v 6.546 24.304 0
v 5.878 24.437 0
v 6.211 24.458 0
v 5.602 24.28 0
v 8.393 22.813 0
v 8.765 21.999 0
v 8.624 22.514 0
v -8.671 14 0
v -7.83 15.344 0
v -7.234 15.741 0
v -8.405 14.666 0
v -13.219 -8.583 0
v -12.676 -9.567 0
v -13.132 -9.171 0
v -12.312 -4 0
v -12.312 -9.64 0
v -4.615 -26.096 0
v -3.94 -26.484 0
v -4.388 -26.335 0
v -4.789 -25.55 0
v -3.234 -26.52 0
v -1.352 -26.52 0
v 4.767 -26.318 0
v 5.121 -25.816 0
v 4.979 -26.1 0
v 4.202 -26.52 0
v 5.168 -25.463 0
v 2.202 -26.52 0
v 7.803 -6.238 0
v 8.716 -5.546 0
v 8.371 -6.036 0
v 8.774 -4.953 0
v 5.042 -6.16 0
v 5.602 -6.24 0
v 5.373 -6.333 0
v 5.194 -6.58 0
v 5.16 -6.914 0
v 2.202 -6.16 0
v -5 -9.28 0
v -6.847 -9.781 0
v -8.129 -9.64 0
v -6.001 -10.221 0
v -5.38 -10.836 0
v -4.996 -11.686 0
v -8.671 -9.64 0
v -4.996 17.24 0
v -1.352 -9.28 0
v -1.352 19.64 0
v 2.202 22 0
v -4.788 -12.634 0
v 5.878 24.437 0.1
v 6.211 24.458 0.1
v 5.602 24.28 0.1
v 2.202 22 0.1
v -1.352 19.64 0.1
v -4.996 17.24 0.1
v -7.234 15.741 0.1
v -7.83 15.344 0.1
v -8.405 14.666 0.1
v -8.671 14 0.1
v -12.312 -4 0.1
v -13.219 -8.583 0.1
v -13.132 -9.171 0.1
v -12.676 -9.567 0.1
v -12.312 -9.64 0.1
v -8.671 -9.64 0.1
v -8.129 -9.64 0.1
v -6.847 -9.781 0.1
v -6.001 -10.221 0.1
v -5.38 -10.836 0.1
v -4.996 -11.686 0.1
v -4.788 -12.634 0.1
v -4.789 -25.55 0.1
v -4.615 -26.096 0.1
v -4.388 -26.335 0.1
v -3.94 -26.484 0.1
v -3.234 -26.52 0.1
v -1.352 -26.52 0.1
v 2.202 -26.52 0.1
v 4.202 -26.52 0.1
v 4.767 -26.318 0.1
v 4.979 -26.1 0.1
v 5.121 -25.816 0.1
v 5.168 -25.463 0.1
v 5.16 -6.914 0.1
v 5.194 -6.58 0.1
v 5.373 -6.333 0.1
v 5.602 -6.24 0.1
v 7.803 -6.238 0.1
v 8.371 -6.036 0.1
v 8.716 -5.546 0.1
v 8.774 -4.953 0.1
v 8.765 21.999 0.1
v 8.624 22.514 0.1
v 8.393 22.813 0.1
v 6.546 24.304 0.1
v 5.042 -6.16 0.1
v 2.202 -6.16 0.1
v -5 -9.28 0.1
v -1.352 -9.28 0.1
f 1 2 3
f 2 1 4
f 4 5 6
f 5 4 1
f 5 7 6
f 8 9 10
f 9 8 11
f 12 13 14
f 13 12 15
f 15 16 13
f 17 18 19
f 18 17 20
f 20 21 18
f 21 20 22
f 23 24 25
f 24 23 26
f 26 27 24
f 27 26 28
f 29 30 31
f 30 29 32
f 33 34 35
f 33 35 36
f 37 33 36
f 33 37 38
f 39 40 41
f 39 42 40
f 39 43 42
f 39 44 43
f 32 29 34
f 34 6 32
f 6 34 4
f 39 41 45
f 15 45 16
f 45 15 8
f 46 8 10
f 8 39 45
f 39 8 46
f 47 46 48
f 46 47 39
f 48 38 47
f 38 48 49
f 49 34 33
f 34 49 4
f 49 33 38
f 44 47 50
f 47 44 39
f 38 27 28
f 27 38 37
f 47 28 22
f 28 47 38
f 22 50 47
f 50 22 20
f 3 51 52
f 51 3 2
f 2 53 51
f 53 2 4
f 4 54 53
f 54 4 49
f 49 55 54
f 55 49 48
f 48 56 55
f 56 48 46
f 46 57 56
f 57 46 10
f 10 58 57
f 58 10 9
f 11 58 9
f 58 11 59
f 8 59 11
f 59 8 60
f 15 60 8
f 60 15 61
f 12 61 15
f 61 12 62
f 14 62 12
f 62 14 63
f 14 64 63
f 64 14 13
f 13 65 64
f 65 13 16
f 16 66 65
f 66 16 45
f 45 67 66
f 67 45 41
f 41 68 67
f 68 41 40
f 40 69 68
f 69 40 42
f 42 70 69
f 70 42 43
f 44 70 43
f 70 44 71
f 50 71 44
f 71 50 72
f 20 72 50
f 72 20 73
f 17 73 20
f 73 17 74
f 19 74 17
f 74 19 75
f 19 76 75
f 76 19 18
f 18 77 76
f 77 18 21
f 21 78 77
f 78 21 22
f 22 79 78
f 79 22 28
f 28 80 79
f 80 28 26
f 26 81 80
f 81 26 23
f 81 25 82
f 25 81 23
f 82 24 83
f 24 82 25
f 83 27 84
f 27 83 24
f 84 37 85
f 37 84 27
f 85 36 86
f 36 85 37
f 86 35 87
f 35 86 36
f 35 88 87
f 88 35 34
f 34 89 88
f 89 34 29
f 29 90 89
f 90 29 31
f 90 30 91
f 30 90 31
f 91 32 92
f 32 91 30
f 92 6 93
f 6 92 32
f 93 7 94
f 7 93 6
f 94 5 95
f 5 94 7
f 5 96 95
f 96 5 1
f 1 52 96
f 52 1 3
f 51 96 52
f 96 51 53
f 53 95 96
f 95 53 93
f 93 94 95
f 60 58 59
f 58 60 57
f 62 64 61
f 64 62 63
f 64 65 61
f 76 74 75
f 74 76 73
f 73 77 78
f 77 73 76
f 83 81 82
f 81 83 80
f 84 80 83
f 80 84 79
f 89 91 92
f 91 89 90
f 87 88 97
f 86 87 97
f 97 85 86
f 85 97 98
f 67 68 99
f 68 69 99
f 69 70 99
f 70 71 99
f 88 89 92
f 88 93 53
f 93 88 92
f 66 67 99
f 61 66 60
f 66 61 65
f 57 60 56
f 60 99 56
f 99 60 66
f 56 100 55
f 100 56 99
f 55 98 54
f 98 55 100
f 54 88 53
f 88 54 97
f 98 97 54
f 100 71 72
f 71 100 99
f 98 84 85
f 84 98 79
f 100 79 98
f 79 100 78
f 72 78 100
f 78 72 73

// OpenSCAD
// file: s/13710as02.scad
use <../../lib.scad>
function ldraw_lib__s__13710as02() = [
// 0 ~Sticker Top for Technic Panel Fairing Smooth (Medium) Flat
// 0 Name: s\13710as02.dat
// 0 Author: Philippe Hurbain [Philo]
// 0 !LDRAW_ORG Subpart UPDATE 2022-02
// 0 !LICENSE Licensed under CC BY 2.0 and CC BY 4.0 : see CAreadme.txt
// 
// 0 BFC CERTIFY CCW
  [0,"BFC","CERTIFY"],
  [0,"BFC","CCW"],
// 
// 0 !HISTORY 2022-03-06 [PTadmin] Official Update 2022-02
// 
// 
// 0 // Top surface
// 4 16 16.364 -0.25 60.759 15.527 -0.25 61.145 14.695 -0.25 61.093 14.004 -0.25 60.7
  [4,16,16.364,-0.25,60.759,15.527,-0.25,61.145,14.695,-0.25,61.093,14.004,-0.25,60.7],
// 4 16 21.912 -0.25 54.998 20.983 -0.25 57.032 16.364 -0.25 60.759 14.004 -0.25 60.7
  [4,16,21.912,-0.25,54.998,20.983,-0.25,57.032,16.364,-0.25,60.759,14.004,-0.25,60.7],
// 3 16 21.912 -0.25 54.998 21.561 -0.25 56.284 20.983 -0.25 57.032
  [3,16,21.912,-0.25,54.998,21.561,-0.25,56.284,20.983,-0.25,57.032],
// 4 16 -18.084 -0.25 39.353 -19.575 -0.25 38.36 -21.013 -0.25 36.664 -21.677 -0.25 35
  [4,16,-18.084,-0.25,39.353,-19.575,-0.25,38.36,-21.013,-0.25,36.664,-21.677,-0.25,35],
// 4 16 -31.689 -0.25 -23.918 -30.78 -0.25 -10 -33.048 -0.25 -21.458 -32.83 -0.25 -22.928
  [4,16,-31.689,-0.25,-23.918,-30.78,-0.25,-10,-33.048,-0.25,-21.458,-32.83,-0.25,-22.928],
// 3 16 -31.689 -0.25 -23.918 -30.78 -0.25 -24.1 -30.78 -0.25 -10
  [3,16,-31.689,-0.25,-23.918,-30.78,-0.25,-24.1,-30.78,-0.25,-10],
// 4 16 -9.849 -0.25 -66.209 -11.972 -0.25 -63.874 -11.537 -0.25 -65.239 -10.971 -0.25 -65.837
  [4,16,-9.849,-0.25,-66.209,-11.972,-0.25,-63.874,-11.537,-0.25,-65.239,-10.971,-0.25,-65.837],
// 4 16 -3.379 -0.25 -66.3 -11.972 -0.25 -63.874 -9.849 -0.25 -66.209 -8.084 -0.25 -66.3
  [4,16,-3.379,-0.25,-66.3,-11.972,-0.25,-63.874,-9.849,-0.25,-66.209,-8.084,-0.25,-66.3],
// 4 16 12.802 -0.25 -64.539 10.504 -0.25 -66.3 11.917 -0.25 -65.795 12.448 -0.25 -65.249
  [4,16,12.802,-0.25,-64.539,10.504,-0.25,-66.3,11.917,-0.25,-65.795,12.448,-0.25,-65.249],
// 4 16 5.504 -0.25 -66.3 10.504 -0.25 -66.3 12.802 -0.25 -64.539 12.92 -0.25 -63.658
  [4,16,5.504,-0.25,-66.3,10.504,-0.25,-66.3,12.802,-0.25,-64.539,12.92,-0.25,-63.658],
// 4 16 19.507 -0.25 -15.595 20.928 -0.25 -15.089 21.79 -0.25 -13.866 21.935 -0.25 -12.382
  [4,16,19.507,-0.25,-15.595,20.928,-0.25,-15.089,21.79,-0.25,-13.866,21.935,-0.25,-12.382],
// 3 16 13.432 -0.25 -15.832 14.004 -0.25 -15.6 12.604 -0.25 -15.4
  [3,16,13.432,-0.25,-15.832,14.004,-0.25,-15.6,12.604,-0.25,-15.4],
// 3 16 12.984 -0.25 -16.45 13.432 -0.25 -15.832 12.604 -0.25 -15.4
  [3,16,12.984,-0.25,-16.45,13.432,-0.25,-15.832,12.604,-0.25,-15.4],
// 4 16 5.504 -0.25 -15.4 12.899 -0.25 -17.286 12.984 -0.25 -16.45 12.604 -0.25 -15.4
  [4,16,5.504,-0.25,-15.4,12.899,-0.25,-17.286,12.984,-0.25,-16.45,12.604,-0.25,-15.4],
// 3 16 -20.323 -0.25 -24.1 -17.118 -0.25 -24.453 -12.5 -0.25 -23.2
  [3,16,-20.323,-0.25,-24.1,-17.118,-0.25,-24.453,-12.5,-0.25,-23.2],
// 3 16 -17.118 -0.25 -24.453 -15.003 -0.25 -25.552 -12.5 -0.25 -23.2
  [3,16,-17.118,-0.25,-24.453,-15.003,-0.25,-25.552,-12.5,-0.25,-23.2],
// 3 16 -15.003 -0.25 -25.552 -13.45 -0.25 -27.089 -12.5 -0.25 -23.2
  [3,16,-15.003,-0.25,-25.552,-13.45,-0.25,-27.089,-12.5,-0.25,-23.2],
// 3 16 -13.45 -0.25 -27.089 -12.491 -0.25 -29.214 -12.5 -0.25 -23.2
  [3,16,-13.45,-0.25,-27.089,-12.491,-0.25,-29.214,-12.5,-0.25,-23.2],
// 3 16 14.004 -0.25 -15.6 19.507 -0.25 -15.595 21.935 -0.25 -12.382
  [3,16,14.004,-0.25,-15.6,19.507,-0.25,-15.595,21.935,-0.25,-12.382],
// 4 16 14.004 -0.25 60.7 14.004 -0.25 -15.6 21.935 -0.25 -12.382 21.912 -0.25 54.998
  [4,16,14.004,-0.25,60.7,14.004,-0.25,-15.6,21.935,-0.25,-12.382,21.912,-0.25,54.998],
// 3 16 -21.677 -0.25 -24.1 -20.323 -0.25 -24.1 -12.5 -0.25 -23.2
  [3,16,-21.677,-0.25,-24.1,-20.323,-0.25,-24.1,-12.5,-0.25,-23.2],
// 4 16 -30.78 -0.25 -24.1 -21.677 -0.25 -24.1 -21.677 -0.25 35 -30.78 -0.25 -10
  [4,16,-30.78,-0.25,-24.1,-21.677,-0.25,-24.1,-21.677,-0.25,35,-30.78,-0.25,-10],
// 3 16 -18.084 -0.25 39.353 -21.677 -0.25 35 -12.491 -0.25 43.1
  [3,16,-18.084,-0.25,39.353,-21.677,-0.25,35,-12.491,-0.25,43.1],
// 4 16 -21.677 -0.25 35 -21.677 -0.25 -24.1 -12.5 -0.25 -23.2 -12.491 -0.25 43.1
  [4,16,-21.677,-0.25,35,-21.677,-0.25,-24.1,-12.5,-0.25,-23.2,-12.491,-0.25,43.1],
// 4 16 -12.5 -0.25 -23.2 -3.379 -0.25 -23.2 -3.379 -0.25 49.1 -12.491 -0.25 43.1
  [4,16,-12.5,-0.25,-23.2,-3.379,-0.25,-23.2,-3.379,-0.25,49.1,-12.491,-0.25,43.1],
// 4 16 -3.379 -0.25 -23.2 5.504 -0.25 -15.4 5.504 -0.25 55 -3.379 -0.25 49.1
  [4,16,-3.379,-0.25,-23.2,5.504,-0.25,-15.4,5.504,-0.25,55,-3.379,-0.25,49.1],
// 4 16 14.004 -0.25 60.7 5.504 -0.25 55 12.604 -0.25 -15.4 14.004 -0.25 -15.6
  [4,16,14.004,-0.25,60.7,5.504,-0.25,55,12.604,-0.25,-15.4,14.004,-0.25,-15.6],
// 3 16 5.504 -0.25 -15.4 12.604 -0.25 -15.4 5.504 -0.25 55
  [3,16,5.504,-0.25,-15.4,12.604,-0.25,-15.4,5.504,-0.25,55],
// 4 16 -11.97 -0.25 -31.586 -3.379 -0.25 -23.2 -12.5 -0.25 -23.2 -12.491 -0.25 -29.214
  [4,16,-11.97,-0.25,-31.586,-3.379,-0.25,-23.2,-12.5,-0.25,-23.2,-12.491,-0.25,-29.214],
// 4 16 5.504 -0.25 -66.3 12.92 -0.25 -63.658 12.899 -0.25 -17.286 5.504 -0.25 -15.4
  [4,16,5.504,-0.25,-66.3,12.92,-0.25,-63.658,12.899,-0.25,-17.286,5.504,-0.25,-15.4],
// 4 16 -3.379 -0.25 -66.3 5.504 -0.25 -66.3 5.504 -0.25 -15.4 -3.379 -0.25 -23.2
  [4,16,-3.379,-0.25,-66.3,5.504,-0.25,-66.3,5.504,-0.25,-15.4,-3.379,-0.25,-23.2],
// 4 16 -11.972 -0.25 -63.874 -3.379 -0.25 -66.3 -3.379 -0.25 -23.2 -11.97 -0.25 -31.586
  [4,16,-11.972,-0.25,-63.874,-3.379,-0.25,-66.3,-3.379,-0.25,-23.2,-11.97,-0.25,-31.586],
];
makepoly(ldraw_lib__s__13710as02(), line=0.2);
// main file
use <../lib.scad>
use <s/13710as01.scad>
use <s/13710as02.scad>
function ldraw_lib__13710a() = [
// 0 Sticker Mindstorms EV3 #1 for Panel Smooth Medium (Needs Work)
// 0 Name: 13710a.dat
// 0 Author: Philippe Hurbain [Philo]
// 0 !LDRAW_ORG Part UPDATE 2022-02
// 0 !LICENSE Licensed under CC BY 2.0 and CC BY 4.0 : see CAreadme.txt
// 
// 0 !HELP To be used with panel 64683
// 
// 0 BFC CERTIFY CCW
  [0,"BFC","CERTIFY"],
  [0,"BFC","CCW"],
// 
// 0 !HISTORY 2022-03-06 [PTadmin] Official Update 2022-02
// 
// 
// 0 // Image file courtesy of the LEGO MINDSTORMS Team
// 0 // Needs Work: Missing more detailed fallback pattern
// 
// 1 16 0 0 0 1 0 0 0 1 0 0 0 1 s\13710as01.dat
  [1,16,0,0,0,1,0,0,0,1,0,0,0,1, ldraw_lib__s__13710as01()],
// 0 !TEXMAP START PLANAR -33.048 0 -66.3 -33.048 0 61.145 21.935 0 -66.3 13710a.png
// 0 !: 1 15 0 0 0 1 0 0 0 1 0 0 0 1 s\13710as02.dat
// 0 !TEXMAP FALLBACK
// 1 15 0 0 0 1 0 0 0 1 0 0 0 1 s\13710as02.dat
  [1,15,0,0,0,1,0,0,0,1,0,0,0,1, ldraw_lib__s__13710as02()],
// 0 !TEXMAP END
];
makepoly(ldraw_lib__13710a(), line=0.2);
